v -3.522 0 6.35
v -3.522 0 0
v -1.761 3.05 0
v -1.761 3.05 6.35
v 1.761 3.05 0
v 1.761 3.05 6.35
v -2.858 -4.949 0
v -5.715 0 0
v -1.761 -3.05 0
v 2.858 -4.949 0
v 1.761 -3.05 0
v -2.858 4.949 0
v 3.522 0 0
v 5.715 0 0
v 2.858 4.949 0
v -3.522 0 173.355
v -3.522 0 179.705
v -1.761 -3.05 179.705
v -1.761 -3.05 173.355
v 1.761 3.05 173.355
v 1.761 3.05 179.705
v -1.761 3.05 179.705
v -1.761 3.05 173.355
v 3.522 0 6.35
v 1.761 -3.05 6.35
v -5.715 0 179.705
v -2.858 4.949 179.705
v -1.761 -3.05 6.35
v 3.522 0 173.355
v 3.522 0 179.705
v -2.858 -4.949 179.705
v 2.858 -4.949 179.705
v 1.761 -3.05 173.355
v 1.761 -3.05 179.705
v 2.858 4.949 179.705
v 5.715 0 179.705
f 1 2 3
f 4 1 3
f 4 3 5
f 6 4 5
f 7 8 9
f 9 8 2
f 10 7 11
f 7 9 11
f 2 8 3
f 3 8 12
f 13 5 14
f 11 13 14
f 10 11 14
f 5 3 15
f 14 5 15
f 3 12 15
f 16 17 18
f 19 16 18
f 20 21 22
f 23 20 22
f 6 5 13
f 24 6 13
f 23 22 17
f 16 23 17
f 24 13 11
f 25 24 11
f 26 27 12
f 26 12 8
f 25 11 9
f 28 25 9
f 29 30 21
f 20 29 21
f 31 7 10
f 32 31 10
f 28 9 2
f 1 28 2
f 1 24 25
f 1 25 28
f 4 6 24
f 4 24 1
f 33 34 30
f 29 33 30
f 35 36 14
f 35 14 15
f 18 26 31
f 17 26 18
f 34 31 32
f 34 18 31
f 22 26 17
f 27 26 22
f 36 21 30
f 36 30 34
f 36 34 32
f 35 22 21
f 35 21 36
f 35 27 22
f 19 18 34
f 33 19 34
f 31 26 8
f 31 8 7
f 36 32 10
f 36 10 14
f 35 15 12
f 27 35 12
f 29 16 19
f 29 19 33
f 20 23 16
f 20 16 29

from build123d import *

# Parameters (mm, degrees)
BOSS_EXTRUDE1_DEPTH = 179.705
CUT_EXTRUDE1_DEPTH  = 6.35
CUT_EXTRUDE2_DEPTH  = 6.35


with BuildPart() as part:
    # Sketch1 → Boss-Extrude1 (new body)
    with BuildSketch(Plane.XY):
        Polygon((5.715, 0), (2.8575, 4.949335183), (-2.8575, 4.949335183), (-5.715, 0), (-2.8575, -4.949335183), (2.8575, -4.949335183), align=None)
    extrude(amount=BOSS_EXTRUDE1_DEPTH)

    # Sketch2 → Cut-Extrude1 (cut)
    with BuildSketch(Plane.XY.offset(179.705)):
        Polygon((3.521836637, 0), (1.760918319, 3.049999996), (-1.760918319, 3.049999996), (-3.521836637, 0), (-1.760918319, -3.049999996), (1.760918319, -3.049999996), align=None)
    extrude(amount=-CUT_EXTRUDE1_DEPTH, mode=Mode.SUBTRACT)

    # Sketch3 → Cut-Extrude2 (cut)
    with BuildSketch(Plane(origin=(0, 0, 0), x_dir=(-1, 0, 0), z_dir=(0, 0, -1))):
        Polygon((1.760918319, 3.049999996), (-1.760918319, 3.049999996), (-3.521836637, 0), (-1.760918319, -3.049999996), (1.760918319, -3.049999996), (3.521836637, 0), align=None)
    extrude(amount=-CUT_EXTRUDE2_DEPTH, mode=Mode.SUBTRACT)


solid = part.part
